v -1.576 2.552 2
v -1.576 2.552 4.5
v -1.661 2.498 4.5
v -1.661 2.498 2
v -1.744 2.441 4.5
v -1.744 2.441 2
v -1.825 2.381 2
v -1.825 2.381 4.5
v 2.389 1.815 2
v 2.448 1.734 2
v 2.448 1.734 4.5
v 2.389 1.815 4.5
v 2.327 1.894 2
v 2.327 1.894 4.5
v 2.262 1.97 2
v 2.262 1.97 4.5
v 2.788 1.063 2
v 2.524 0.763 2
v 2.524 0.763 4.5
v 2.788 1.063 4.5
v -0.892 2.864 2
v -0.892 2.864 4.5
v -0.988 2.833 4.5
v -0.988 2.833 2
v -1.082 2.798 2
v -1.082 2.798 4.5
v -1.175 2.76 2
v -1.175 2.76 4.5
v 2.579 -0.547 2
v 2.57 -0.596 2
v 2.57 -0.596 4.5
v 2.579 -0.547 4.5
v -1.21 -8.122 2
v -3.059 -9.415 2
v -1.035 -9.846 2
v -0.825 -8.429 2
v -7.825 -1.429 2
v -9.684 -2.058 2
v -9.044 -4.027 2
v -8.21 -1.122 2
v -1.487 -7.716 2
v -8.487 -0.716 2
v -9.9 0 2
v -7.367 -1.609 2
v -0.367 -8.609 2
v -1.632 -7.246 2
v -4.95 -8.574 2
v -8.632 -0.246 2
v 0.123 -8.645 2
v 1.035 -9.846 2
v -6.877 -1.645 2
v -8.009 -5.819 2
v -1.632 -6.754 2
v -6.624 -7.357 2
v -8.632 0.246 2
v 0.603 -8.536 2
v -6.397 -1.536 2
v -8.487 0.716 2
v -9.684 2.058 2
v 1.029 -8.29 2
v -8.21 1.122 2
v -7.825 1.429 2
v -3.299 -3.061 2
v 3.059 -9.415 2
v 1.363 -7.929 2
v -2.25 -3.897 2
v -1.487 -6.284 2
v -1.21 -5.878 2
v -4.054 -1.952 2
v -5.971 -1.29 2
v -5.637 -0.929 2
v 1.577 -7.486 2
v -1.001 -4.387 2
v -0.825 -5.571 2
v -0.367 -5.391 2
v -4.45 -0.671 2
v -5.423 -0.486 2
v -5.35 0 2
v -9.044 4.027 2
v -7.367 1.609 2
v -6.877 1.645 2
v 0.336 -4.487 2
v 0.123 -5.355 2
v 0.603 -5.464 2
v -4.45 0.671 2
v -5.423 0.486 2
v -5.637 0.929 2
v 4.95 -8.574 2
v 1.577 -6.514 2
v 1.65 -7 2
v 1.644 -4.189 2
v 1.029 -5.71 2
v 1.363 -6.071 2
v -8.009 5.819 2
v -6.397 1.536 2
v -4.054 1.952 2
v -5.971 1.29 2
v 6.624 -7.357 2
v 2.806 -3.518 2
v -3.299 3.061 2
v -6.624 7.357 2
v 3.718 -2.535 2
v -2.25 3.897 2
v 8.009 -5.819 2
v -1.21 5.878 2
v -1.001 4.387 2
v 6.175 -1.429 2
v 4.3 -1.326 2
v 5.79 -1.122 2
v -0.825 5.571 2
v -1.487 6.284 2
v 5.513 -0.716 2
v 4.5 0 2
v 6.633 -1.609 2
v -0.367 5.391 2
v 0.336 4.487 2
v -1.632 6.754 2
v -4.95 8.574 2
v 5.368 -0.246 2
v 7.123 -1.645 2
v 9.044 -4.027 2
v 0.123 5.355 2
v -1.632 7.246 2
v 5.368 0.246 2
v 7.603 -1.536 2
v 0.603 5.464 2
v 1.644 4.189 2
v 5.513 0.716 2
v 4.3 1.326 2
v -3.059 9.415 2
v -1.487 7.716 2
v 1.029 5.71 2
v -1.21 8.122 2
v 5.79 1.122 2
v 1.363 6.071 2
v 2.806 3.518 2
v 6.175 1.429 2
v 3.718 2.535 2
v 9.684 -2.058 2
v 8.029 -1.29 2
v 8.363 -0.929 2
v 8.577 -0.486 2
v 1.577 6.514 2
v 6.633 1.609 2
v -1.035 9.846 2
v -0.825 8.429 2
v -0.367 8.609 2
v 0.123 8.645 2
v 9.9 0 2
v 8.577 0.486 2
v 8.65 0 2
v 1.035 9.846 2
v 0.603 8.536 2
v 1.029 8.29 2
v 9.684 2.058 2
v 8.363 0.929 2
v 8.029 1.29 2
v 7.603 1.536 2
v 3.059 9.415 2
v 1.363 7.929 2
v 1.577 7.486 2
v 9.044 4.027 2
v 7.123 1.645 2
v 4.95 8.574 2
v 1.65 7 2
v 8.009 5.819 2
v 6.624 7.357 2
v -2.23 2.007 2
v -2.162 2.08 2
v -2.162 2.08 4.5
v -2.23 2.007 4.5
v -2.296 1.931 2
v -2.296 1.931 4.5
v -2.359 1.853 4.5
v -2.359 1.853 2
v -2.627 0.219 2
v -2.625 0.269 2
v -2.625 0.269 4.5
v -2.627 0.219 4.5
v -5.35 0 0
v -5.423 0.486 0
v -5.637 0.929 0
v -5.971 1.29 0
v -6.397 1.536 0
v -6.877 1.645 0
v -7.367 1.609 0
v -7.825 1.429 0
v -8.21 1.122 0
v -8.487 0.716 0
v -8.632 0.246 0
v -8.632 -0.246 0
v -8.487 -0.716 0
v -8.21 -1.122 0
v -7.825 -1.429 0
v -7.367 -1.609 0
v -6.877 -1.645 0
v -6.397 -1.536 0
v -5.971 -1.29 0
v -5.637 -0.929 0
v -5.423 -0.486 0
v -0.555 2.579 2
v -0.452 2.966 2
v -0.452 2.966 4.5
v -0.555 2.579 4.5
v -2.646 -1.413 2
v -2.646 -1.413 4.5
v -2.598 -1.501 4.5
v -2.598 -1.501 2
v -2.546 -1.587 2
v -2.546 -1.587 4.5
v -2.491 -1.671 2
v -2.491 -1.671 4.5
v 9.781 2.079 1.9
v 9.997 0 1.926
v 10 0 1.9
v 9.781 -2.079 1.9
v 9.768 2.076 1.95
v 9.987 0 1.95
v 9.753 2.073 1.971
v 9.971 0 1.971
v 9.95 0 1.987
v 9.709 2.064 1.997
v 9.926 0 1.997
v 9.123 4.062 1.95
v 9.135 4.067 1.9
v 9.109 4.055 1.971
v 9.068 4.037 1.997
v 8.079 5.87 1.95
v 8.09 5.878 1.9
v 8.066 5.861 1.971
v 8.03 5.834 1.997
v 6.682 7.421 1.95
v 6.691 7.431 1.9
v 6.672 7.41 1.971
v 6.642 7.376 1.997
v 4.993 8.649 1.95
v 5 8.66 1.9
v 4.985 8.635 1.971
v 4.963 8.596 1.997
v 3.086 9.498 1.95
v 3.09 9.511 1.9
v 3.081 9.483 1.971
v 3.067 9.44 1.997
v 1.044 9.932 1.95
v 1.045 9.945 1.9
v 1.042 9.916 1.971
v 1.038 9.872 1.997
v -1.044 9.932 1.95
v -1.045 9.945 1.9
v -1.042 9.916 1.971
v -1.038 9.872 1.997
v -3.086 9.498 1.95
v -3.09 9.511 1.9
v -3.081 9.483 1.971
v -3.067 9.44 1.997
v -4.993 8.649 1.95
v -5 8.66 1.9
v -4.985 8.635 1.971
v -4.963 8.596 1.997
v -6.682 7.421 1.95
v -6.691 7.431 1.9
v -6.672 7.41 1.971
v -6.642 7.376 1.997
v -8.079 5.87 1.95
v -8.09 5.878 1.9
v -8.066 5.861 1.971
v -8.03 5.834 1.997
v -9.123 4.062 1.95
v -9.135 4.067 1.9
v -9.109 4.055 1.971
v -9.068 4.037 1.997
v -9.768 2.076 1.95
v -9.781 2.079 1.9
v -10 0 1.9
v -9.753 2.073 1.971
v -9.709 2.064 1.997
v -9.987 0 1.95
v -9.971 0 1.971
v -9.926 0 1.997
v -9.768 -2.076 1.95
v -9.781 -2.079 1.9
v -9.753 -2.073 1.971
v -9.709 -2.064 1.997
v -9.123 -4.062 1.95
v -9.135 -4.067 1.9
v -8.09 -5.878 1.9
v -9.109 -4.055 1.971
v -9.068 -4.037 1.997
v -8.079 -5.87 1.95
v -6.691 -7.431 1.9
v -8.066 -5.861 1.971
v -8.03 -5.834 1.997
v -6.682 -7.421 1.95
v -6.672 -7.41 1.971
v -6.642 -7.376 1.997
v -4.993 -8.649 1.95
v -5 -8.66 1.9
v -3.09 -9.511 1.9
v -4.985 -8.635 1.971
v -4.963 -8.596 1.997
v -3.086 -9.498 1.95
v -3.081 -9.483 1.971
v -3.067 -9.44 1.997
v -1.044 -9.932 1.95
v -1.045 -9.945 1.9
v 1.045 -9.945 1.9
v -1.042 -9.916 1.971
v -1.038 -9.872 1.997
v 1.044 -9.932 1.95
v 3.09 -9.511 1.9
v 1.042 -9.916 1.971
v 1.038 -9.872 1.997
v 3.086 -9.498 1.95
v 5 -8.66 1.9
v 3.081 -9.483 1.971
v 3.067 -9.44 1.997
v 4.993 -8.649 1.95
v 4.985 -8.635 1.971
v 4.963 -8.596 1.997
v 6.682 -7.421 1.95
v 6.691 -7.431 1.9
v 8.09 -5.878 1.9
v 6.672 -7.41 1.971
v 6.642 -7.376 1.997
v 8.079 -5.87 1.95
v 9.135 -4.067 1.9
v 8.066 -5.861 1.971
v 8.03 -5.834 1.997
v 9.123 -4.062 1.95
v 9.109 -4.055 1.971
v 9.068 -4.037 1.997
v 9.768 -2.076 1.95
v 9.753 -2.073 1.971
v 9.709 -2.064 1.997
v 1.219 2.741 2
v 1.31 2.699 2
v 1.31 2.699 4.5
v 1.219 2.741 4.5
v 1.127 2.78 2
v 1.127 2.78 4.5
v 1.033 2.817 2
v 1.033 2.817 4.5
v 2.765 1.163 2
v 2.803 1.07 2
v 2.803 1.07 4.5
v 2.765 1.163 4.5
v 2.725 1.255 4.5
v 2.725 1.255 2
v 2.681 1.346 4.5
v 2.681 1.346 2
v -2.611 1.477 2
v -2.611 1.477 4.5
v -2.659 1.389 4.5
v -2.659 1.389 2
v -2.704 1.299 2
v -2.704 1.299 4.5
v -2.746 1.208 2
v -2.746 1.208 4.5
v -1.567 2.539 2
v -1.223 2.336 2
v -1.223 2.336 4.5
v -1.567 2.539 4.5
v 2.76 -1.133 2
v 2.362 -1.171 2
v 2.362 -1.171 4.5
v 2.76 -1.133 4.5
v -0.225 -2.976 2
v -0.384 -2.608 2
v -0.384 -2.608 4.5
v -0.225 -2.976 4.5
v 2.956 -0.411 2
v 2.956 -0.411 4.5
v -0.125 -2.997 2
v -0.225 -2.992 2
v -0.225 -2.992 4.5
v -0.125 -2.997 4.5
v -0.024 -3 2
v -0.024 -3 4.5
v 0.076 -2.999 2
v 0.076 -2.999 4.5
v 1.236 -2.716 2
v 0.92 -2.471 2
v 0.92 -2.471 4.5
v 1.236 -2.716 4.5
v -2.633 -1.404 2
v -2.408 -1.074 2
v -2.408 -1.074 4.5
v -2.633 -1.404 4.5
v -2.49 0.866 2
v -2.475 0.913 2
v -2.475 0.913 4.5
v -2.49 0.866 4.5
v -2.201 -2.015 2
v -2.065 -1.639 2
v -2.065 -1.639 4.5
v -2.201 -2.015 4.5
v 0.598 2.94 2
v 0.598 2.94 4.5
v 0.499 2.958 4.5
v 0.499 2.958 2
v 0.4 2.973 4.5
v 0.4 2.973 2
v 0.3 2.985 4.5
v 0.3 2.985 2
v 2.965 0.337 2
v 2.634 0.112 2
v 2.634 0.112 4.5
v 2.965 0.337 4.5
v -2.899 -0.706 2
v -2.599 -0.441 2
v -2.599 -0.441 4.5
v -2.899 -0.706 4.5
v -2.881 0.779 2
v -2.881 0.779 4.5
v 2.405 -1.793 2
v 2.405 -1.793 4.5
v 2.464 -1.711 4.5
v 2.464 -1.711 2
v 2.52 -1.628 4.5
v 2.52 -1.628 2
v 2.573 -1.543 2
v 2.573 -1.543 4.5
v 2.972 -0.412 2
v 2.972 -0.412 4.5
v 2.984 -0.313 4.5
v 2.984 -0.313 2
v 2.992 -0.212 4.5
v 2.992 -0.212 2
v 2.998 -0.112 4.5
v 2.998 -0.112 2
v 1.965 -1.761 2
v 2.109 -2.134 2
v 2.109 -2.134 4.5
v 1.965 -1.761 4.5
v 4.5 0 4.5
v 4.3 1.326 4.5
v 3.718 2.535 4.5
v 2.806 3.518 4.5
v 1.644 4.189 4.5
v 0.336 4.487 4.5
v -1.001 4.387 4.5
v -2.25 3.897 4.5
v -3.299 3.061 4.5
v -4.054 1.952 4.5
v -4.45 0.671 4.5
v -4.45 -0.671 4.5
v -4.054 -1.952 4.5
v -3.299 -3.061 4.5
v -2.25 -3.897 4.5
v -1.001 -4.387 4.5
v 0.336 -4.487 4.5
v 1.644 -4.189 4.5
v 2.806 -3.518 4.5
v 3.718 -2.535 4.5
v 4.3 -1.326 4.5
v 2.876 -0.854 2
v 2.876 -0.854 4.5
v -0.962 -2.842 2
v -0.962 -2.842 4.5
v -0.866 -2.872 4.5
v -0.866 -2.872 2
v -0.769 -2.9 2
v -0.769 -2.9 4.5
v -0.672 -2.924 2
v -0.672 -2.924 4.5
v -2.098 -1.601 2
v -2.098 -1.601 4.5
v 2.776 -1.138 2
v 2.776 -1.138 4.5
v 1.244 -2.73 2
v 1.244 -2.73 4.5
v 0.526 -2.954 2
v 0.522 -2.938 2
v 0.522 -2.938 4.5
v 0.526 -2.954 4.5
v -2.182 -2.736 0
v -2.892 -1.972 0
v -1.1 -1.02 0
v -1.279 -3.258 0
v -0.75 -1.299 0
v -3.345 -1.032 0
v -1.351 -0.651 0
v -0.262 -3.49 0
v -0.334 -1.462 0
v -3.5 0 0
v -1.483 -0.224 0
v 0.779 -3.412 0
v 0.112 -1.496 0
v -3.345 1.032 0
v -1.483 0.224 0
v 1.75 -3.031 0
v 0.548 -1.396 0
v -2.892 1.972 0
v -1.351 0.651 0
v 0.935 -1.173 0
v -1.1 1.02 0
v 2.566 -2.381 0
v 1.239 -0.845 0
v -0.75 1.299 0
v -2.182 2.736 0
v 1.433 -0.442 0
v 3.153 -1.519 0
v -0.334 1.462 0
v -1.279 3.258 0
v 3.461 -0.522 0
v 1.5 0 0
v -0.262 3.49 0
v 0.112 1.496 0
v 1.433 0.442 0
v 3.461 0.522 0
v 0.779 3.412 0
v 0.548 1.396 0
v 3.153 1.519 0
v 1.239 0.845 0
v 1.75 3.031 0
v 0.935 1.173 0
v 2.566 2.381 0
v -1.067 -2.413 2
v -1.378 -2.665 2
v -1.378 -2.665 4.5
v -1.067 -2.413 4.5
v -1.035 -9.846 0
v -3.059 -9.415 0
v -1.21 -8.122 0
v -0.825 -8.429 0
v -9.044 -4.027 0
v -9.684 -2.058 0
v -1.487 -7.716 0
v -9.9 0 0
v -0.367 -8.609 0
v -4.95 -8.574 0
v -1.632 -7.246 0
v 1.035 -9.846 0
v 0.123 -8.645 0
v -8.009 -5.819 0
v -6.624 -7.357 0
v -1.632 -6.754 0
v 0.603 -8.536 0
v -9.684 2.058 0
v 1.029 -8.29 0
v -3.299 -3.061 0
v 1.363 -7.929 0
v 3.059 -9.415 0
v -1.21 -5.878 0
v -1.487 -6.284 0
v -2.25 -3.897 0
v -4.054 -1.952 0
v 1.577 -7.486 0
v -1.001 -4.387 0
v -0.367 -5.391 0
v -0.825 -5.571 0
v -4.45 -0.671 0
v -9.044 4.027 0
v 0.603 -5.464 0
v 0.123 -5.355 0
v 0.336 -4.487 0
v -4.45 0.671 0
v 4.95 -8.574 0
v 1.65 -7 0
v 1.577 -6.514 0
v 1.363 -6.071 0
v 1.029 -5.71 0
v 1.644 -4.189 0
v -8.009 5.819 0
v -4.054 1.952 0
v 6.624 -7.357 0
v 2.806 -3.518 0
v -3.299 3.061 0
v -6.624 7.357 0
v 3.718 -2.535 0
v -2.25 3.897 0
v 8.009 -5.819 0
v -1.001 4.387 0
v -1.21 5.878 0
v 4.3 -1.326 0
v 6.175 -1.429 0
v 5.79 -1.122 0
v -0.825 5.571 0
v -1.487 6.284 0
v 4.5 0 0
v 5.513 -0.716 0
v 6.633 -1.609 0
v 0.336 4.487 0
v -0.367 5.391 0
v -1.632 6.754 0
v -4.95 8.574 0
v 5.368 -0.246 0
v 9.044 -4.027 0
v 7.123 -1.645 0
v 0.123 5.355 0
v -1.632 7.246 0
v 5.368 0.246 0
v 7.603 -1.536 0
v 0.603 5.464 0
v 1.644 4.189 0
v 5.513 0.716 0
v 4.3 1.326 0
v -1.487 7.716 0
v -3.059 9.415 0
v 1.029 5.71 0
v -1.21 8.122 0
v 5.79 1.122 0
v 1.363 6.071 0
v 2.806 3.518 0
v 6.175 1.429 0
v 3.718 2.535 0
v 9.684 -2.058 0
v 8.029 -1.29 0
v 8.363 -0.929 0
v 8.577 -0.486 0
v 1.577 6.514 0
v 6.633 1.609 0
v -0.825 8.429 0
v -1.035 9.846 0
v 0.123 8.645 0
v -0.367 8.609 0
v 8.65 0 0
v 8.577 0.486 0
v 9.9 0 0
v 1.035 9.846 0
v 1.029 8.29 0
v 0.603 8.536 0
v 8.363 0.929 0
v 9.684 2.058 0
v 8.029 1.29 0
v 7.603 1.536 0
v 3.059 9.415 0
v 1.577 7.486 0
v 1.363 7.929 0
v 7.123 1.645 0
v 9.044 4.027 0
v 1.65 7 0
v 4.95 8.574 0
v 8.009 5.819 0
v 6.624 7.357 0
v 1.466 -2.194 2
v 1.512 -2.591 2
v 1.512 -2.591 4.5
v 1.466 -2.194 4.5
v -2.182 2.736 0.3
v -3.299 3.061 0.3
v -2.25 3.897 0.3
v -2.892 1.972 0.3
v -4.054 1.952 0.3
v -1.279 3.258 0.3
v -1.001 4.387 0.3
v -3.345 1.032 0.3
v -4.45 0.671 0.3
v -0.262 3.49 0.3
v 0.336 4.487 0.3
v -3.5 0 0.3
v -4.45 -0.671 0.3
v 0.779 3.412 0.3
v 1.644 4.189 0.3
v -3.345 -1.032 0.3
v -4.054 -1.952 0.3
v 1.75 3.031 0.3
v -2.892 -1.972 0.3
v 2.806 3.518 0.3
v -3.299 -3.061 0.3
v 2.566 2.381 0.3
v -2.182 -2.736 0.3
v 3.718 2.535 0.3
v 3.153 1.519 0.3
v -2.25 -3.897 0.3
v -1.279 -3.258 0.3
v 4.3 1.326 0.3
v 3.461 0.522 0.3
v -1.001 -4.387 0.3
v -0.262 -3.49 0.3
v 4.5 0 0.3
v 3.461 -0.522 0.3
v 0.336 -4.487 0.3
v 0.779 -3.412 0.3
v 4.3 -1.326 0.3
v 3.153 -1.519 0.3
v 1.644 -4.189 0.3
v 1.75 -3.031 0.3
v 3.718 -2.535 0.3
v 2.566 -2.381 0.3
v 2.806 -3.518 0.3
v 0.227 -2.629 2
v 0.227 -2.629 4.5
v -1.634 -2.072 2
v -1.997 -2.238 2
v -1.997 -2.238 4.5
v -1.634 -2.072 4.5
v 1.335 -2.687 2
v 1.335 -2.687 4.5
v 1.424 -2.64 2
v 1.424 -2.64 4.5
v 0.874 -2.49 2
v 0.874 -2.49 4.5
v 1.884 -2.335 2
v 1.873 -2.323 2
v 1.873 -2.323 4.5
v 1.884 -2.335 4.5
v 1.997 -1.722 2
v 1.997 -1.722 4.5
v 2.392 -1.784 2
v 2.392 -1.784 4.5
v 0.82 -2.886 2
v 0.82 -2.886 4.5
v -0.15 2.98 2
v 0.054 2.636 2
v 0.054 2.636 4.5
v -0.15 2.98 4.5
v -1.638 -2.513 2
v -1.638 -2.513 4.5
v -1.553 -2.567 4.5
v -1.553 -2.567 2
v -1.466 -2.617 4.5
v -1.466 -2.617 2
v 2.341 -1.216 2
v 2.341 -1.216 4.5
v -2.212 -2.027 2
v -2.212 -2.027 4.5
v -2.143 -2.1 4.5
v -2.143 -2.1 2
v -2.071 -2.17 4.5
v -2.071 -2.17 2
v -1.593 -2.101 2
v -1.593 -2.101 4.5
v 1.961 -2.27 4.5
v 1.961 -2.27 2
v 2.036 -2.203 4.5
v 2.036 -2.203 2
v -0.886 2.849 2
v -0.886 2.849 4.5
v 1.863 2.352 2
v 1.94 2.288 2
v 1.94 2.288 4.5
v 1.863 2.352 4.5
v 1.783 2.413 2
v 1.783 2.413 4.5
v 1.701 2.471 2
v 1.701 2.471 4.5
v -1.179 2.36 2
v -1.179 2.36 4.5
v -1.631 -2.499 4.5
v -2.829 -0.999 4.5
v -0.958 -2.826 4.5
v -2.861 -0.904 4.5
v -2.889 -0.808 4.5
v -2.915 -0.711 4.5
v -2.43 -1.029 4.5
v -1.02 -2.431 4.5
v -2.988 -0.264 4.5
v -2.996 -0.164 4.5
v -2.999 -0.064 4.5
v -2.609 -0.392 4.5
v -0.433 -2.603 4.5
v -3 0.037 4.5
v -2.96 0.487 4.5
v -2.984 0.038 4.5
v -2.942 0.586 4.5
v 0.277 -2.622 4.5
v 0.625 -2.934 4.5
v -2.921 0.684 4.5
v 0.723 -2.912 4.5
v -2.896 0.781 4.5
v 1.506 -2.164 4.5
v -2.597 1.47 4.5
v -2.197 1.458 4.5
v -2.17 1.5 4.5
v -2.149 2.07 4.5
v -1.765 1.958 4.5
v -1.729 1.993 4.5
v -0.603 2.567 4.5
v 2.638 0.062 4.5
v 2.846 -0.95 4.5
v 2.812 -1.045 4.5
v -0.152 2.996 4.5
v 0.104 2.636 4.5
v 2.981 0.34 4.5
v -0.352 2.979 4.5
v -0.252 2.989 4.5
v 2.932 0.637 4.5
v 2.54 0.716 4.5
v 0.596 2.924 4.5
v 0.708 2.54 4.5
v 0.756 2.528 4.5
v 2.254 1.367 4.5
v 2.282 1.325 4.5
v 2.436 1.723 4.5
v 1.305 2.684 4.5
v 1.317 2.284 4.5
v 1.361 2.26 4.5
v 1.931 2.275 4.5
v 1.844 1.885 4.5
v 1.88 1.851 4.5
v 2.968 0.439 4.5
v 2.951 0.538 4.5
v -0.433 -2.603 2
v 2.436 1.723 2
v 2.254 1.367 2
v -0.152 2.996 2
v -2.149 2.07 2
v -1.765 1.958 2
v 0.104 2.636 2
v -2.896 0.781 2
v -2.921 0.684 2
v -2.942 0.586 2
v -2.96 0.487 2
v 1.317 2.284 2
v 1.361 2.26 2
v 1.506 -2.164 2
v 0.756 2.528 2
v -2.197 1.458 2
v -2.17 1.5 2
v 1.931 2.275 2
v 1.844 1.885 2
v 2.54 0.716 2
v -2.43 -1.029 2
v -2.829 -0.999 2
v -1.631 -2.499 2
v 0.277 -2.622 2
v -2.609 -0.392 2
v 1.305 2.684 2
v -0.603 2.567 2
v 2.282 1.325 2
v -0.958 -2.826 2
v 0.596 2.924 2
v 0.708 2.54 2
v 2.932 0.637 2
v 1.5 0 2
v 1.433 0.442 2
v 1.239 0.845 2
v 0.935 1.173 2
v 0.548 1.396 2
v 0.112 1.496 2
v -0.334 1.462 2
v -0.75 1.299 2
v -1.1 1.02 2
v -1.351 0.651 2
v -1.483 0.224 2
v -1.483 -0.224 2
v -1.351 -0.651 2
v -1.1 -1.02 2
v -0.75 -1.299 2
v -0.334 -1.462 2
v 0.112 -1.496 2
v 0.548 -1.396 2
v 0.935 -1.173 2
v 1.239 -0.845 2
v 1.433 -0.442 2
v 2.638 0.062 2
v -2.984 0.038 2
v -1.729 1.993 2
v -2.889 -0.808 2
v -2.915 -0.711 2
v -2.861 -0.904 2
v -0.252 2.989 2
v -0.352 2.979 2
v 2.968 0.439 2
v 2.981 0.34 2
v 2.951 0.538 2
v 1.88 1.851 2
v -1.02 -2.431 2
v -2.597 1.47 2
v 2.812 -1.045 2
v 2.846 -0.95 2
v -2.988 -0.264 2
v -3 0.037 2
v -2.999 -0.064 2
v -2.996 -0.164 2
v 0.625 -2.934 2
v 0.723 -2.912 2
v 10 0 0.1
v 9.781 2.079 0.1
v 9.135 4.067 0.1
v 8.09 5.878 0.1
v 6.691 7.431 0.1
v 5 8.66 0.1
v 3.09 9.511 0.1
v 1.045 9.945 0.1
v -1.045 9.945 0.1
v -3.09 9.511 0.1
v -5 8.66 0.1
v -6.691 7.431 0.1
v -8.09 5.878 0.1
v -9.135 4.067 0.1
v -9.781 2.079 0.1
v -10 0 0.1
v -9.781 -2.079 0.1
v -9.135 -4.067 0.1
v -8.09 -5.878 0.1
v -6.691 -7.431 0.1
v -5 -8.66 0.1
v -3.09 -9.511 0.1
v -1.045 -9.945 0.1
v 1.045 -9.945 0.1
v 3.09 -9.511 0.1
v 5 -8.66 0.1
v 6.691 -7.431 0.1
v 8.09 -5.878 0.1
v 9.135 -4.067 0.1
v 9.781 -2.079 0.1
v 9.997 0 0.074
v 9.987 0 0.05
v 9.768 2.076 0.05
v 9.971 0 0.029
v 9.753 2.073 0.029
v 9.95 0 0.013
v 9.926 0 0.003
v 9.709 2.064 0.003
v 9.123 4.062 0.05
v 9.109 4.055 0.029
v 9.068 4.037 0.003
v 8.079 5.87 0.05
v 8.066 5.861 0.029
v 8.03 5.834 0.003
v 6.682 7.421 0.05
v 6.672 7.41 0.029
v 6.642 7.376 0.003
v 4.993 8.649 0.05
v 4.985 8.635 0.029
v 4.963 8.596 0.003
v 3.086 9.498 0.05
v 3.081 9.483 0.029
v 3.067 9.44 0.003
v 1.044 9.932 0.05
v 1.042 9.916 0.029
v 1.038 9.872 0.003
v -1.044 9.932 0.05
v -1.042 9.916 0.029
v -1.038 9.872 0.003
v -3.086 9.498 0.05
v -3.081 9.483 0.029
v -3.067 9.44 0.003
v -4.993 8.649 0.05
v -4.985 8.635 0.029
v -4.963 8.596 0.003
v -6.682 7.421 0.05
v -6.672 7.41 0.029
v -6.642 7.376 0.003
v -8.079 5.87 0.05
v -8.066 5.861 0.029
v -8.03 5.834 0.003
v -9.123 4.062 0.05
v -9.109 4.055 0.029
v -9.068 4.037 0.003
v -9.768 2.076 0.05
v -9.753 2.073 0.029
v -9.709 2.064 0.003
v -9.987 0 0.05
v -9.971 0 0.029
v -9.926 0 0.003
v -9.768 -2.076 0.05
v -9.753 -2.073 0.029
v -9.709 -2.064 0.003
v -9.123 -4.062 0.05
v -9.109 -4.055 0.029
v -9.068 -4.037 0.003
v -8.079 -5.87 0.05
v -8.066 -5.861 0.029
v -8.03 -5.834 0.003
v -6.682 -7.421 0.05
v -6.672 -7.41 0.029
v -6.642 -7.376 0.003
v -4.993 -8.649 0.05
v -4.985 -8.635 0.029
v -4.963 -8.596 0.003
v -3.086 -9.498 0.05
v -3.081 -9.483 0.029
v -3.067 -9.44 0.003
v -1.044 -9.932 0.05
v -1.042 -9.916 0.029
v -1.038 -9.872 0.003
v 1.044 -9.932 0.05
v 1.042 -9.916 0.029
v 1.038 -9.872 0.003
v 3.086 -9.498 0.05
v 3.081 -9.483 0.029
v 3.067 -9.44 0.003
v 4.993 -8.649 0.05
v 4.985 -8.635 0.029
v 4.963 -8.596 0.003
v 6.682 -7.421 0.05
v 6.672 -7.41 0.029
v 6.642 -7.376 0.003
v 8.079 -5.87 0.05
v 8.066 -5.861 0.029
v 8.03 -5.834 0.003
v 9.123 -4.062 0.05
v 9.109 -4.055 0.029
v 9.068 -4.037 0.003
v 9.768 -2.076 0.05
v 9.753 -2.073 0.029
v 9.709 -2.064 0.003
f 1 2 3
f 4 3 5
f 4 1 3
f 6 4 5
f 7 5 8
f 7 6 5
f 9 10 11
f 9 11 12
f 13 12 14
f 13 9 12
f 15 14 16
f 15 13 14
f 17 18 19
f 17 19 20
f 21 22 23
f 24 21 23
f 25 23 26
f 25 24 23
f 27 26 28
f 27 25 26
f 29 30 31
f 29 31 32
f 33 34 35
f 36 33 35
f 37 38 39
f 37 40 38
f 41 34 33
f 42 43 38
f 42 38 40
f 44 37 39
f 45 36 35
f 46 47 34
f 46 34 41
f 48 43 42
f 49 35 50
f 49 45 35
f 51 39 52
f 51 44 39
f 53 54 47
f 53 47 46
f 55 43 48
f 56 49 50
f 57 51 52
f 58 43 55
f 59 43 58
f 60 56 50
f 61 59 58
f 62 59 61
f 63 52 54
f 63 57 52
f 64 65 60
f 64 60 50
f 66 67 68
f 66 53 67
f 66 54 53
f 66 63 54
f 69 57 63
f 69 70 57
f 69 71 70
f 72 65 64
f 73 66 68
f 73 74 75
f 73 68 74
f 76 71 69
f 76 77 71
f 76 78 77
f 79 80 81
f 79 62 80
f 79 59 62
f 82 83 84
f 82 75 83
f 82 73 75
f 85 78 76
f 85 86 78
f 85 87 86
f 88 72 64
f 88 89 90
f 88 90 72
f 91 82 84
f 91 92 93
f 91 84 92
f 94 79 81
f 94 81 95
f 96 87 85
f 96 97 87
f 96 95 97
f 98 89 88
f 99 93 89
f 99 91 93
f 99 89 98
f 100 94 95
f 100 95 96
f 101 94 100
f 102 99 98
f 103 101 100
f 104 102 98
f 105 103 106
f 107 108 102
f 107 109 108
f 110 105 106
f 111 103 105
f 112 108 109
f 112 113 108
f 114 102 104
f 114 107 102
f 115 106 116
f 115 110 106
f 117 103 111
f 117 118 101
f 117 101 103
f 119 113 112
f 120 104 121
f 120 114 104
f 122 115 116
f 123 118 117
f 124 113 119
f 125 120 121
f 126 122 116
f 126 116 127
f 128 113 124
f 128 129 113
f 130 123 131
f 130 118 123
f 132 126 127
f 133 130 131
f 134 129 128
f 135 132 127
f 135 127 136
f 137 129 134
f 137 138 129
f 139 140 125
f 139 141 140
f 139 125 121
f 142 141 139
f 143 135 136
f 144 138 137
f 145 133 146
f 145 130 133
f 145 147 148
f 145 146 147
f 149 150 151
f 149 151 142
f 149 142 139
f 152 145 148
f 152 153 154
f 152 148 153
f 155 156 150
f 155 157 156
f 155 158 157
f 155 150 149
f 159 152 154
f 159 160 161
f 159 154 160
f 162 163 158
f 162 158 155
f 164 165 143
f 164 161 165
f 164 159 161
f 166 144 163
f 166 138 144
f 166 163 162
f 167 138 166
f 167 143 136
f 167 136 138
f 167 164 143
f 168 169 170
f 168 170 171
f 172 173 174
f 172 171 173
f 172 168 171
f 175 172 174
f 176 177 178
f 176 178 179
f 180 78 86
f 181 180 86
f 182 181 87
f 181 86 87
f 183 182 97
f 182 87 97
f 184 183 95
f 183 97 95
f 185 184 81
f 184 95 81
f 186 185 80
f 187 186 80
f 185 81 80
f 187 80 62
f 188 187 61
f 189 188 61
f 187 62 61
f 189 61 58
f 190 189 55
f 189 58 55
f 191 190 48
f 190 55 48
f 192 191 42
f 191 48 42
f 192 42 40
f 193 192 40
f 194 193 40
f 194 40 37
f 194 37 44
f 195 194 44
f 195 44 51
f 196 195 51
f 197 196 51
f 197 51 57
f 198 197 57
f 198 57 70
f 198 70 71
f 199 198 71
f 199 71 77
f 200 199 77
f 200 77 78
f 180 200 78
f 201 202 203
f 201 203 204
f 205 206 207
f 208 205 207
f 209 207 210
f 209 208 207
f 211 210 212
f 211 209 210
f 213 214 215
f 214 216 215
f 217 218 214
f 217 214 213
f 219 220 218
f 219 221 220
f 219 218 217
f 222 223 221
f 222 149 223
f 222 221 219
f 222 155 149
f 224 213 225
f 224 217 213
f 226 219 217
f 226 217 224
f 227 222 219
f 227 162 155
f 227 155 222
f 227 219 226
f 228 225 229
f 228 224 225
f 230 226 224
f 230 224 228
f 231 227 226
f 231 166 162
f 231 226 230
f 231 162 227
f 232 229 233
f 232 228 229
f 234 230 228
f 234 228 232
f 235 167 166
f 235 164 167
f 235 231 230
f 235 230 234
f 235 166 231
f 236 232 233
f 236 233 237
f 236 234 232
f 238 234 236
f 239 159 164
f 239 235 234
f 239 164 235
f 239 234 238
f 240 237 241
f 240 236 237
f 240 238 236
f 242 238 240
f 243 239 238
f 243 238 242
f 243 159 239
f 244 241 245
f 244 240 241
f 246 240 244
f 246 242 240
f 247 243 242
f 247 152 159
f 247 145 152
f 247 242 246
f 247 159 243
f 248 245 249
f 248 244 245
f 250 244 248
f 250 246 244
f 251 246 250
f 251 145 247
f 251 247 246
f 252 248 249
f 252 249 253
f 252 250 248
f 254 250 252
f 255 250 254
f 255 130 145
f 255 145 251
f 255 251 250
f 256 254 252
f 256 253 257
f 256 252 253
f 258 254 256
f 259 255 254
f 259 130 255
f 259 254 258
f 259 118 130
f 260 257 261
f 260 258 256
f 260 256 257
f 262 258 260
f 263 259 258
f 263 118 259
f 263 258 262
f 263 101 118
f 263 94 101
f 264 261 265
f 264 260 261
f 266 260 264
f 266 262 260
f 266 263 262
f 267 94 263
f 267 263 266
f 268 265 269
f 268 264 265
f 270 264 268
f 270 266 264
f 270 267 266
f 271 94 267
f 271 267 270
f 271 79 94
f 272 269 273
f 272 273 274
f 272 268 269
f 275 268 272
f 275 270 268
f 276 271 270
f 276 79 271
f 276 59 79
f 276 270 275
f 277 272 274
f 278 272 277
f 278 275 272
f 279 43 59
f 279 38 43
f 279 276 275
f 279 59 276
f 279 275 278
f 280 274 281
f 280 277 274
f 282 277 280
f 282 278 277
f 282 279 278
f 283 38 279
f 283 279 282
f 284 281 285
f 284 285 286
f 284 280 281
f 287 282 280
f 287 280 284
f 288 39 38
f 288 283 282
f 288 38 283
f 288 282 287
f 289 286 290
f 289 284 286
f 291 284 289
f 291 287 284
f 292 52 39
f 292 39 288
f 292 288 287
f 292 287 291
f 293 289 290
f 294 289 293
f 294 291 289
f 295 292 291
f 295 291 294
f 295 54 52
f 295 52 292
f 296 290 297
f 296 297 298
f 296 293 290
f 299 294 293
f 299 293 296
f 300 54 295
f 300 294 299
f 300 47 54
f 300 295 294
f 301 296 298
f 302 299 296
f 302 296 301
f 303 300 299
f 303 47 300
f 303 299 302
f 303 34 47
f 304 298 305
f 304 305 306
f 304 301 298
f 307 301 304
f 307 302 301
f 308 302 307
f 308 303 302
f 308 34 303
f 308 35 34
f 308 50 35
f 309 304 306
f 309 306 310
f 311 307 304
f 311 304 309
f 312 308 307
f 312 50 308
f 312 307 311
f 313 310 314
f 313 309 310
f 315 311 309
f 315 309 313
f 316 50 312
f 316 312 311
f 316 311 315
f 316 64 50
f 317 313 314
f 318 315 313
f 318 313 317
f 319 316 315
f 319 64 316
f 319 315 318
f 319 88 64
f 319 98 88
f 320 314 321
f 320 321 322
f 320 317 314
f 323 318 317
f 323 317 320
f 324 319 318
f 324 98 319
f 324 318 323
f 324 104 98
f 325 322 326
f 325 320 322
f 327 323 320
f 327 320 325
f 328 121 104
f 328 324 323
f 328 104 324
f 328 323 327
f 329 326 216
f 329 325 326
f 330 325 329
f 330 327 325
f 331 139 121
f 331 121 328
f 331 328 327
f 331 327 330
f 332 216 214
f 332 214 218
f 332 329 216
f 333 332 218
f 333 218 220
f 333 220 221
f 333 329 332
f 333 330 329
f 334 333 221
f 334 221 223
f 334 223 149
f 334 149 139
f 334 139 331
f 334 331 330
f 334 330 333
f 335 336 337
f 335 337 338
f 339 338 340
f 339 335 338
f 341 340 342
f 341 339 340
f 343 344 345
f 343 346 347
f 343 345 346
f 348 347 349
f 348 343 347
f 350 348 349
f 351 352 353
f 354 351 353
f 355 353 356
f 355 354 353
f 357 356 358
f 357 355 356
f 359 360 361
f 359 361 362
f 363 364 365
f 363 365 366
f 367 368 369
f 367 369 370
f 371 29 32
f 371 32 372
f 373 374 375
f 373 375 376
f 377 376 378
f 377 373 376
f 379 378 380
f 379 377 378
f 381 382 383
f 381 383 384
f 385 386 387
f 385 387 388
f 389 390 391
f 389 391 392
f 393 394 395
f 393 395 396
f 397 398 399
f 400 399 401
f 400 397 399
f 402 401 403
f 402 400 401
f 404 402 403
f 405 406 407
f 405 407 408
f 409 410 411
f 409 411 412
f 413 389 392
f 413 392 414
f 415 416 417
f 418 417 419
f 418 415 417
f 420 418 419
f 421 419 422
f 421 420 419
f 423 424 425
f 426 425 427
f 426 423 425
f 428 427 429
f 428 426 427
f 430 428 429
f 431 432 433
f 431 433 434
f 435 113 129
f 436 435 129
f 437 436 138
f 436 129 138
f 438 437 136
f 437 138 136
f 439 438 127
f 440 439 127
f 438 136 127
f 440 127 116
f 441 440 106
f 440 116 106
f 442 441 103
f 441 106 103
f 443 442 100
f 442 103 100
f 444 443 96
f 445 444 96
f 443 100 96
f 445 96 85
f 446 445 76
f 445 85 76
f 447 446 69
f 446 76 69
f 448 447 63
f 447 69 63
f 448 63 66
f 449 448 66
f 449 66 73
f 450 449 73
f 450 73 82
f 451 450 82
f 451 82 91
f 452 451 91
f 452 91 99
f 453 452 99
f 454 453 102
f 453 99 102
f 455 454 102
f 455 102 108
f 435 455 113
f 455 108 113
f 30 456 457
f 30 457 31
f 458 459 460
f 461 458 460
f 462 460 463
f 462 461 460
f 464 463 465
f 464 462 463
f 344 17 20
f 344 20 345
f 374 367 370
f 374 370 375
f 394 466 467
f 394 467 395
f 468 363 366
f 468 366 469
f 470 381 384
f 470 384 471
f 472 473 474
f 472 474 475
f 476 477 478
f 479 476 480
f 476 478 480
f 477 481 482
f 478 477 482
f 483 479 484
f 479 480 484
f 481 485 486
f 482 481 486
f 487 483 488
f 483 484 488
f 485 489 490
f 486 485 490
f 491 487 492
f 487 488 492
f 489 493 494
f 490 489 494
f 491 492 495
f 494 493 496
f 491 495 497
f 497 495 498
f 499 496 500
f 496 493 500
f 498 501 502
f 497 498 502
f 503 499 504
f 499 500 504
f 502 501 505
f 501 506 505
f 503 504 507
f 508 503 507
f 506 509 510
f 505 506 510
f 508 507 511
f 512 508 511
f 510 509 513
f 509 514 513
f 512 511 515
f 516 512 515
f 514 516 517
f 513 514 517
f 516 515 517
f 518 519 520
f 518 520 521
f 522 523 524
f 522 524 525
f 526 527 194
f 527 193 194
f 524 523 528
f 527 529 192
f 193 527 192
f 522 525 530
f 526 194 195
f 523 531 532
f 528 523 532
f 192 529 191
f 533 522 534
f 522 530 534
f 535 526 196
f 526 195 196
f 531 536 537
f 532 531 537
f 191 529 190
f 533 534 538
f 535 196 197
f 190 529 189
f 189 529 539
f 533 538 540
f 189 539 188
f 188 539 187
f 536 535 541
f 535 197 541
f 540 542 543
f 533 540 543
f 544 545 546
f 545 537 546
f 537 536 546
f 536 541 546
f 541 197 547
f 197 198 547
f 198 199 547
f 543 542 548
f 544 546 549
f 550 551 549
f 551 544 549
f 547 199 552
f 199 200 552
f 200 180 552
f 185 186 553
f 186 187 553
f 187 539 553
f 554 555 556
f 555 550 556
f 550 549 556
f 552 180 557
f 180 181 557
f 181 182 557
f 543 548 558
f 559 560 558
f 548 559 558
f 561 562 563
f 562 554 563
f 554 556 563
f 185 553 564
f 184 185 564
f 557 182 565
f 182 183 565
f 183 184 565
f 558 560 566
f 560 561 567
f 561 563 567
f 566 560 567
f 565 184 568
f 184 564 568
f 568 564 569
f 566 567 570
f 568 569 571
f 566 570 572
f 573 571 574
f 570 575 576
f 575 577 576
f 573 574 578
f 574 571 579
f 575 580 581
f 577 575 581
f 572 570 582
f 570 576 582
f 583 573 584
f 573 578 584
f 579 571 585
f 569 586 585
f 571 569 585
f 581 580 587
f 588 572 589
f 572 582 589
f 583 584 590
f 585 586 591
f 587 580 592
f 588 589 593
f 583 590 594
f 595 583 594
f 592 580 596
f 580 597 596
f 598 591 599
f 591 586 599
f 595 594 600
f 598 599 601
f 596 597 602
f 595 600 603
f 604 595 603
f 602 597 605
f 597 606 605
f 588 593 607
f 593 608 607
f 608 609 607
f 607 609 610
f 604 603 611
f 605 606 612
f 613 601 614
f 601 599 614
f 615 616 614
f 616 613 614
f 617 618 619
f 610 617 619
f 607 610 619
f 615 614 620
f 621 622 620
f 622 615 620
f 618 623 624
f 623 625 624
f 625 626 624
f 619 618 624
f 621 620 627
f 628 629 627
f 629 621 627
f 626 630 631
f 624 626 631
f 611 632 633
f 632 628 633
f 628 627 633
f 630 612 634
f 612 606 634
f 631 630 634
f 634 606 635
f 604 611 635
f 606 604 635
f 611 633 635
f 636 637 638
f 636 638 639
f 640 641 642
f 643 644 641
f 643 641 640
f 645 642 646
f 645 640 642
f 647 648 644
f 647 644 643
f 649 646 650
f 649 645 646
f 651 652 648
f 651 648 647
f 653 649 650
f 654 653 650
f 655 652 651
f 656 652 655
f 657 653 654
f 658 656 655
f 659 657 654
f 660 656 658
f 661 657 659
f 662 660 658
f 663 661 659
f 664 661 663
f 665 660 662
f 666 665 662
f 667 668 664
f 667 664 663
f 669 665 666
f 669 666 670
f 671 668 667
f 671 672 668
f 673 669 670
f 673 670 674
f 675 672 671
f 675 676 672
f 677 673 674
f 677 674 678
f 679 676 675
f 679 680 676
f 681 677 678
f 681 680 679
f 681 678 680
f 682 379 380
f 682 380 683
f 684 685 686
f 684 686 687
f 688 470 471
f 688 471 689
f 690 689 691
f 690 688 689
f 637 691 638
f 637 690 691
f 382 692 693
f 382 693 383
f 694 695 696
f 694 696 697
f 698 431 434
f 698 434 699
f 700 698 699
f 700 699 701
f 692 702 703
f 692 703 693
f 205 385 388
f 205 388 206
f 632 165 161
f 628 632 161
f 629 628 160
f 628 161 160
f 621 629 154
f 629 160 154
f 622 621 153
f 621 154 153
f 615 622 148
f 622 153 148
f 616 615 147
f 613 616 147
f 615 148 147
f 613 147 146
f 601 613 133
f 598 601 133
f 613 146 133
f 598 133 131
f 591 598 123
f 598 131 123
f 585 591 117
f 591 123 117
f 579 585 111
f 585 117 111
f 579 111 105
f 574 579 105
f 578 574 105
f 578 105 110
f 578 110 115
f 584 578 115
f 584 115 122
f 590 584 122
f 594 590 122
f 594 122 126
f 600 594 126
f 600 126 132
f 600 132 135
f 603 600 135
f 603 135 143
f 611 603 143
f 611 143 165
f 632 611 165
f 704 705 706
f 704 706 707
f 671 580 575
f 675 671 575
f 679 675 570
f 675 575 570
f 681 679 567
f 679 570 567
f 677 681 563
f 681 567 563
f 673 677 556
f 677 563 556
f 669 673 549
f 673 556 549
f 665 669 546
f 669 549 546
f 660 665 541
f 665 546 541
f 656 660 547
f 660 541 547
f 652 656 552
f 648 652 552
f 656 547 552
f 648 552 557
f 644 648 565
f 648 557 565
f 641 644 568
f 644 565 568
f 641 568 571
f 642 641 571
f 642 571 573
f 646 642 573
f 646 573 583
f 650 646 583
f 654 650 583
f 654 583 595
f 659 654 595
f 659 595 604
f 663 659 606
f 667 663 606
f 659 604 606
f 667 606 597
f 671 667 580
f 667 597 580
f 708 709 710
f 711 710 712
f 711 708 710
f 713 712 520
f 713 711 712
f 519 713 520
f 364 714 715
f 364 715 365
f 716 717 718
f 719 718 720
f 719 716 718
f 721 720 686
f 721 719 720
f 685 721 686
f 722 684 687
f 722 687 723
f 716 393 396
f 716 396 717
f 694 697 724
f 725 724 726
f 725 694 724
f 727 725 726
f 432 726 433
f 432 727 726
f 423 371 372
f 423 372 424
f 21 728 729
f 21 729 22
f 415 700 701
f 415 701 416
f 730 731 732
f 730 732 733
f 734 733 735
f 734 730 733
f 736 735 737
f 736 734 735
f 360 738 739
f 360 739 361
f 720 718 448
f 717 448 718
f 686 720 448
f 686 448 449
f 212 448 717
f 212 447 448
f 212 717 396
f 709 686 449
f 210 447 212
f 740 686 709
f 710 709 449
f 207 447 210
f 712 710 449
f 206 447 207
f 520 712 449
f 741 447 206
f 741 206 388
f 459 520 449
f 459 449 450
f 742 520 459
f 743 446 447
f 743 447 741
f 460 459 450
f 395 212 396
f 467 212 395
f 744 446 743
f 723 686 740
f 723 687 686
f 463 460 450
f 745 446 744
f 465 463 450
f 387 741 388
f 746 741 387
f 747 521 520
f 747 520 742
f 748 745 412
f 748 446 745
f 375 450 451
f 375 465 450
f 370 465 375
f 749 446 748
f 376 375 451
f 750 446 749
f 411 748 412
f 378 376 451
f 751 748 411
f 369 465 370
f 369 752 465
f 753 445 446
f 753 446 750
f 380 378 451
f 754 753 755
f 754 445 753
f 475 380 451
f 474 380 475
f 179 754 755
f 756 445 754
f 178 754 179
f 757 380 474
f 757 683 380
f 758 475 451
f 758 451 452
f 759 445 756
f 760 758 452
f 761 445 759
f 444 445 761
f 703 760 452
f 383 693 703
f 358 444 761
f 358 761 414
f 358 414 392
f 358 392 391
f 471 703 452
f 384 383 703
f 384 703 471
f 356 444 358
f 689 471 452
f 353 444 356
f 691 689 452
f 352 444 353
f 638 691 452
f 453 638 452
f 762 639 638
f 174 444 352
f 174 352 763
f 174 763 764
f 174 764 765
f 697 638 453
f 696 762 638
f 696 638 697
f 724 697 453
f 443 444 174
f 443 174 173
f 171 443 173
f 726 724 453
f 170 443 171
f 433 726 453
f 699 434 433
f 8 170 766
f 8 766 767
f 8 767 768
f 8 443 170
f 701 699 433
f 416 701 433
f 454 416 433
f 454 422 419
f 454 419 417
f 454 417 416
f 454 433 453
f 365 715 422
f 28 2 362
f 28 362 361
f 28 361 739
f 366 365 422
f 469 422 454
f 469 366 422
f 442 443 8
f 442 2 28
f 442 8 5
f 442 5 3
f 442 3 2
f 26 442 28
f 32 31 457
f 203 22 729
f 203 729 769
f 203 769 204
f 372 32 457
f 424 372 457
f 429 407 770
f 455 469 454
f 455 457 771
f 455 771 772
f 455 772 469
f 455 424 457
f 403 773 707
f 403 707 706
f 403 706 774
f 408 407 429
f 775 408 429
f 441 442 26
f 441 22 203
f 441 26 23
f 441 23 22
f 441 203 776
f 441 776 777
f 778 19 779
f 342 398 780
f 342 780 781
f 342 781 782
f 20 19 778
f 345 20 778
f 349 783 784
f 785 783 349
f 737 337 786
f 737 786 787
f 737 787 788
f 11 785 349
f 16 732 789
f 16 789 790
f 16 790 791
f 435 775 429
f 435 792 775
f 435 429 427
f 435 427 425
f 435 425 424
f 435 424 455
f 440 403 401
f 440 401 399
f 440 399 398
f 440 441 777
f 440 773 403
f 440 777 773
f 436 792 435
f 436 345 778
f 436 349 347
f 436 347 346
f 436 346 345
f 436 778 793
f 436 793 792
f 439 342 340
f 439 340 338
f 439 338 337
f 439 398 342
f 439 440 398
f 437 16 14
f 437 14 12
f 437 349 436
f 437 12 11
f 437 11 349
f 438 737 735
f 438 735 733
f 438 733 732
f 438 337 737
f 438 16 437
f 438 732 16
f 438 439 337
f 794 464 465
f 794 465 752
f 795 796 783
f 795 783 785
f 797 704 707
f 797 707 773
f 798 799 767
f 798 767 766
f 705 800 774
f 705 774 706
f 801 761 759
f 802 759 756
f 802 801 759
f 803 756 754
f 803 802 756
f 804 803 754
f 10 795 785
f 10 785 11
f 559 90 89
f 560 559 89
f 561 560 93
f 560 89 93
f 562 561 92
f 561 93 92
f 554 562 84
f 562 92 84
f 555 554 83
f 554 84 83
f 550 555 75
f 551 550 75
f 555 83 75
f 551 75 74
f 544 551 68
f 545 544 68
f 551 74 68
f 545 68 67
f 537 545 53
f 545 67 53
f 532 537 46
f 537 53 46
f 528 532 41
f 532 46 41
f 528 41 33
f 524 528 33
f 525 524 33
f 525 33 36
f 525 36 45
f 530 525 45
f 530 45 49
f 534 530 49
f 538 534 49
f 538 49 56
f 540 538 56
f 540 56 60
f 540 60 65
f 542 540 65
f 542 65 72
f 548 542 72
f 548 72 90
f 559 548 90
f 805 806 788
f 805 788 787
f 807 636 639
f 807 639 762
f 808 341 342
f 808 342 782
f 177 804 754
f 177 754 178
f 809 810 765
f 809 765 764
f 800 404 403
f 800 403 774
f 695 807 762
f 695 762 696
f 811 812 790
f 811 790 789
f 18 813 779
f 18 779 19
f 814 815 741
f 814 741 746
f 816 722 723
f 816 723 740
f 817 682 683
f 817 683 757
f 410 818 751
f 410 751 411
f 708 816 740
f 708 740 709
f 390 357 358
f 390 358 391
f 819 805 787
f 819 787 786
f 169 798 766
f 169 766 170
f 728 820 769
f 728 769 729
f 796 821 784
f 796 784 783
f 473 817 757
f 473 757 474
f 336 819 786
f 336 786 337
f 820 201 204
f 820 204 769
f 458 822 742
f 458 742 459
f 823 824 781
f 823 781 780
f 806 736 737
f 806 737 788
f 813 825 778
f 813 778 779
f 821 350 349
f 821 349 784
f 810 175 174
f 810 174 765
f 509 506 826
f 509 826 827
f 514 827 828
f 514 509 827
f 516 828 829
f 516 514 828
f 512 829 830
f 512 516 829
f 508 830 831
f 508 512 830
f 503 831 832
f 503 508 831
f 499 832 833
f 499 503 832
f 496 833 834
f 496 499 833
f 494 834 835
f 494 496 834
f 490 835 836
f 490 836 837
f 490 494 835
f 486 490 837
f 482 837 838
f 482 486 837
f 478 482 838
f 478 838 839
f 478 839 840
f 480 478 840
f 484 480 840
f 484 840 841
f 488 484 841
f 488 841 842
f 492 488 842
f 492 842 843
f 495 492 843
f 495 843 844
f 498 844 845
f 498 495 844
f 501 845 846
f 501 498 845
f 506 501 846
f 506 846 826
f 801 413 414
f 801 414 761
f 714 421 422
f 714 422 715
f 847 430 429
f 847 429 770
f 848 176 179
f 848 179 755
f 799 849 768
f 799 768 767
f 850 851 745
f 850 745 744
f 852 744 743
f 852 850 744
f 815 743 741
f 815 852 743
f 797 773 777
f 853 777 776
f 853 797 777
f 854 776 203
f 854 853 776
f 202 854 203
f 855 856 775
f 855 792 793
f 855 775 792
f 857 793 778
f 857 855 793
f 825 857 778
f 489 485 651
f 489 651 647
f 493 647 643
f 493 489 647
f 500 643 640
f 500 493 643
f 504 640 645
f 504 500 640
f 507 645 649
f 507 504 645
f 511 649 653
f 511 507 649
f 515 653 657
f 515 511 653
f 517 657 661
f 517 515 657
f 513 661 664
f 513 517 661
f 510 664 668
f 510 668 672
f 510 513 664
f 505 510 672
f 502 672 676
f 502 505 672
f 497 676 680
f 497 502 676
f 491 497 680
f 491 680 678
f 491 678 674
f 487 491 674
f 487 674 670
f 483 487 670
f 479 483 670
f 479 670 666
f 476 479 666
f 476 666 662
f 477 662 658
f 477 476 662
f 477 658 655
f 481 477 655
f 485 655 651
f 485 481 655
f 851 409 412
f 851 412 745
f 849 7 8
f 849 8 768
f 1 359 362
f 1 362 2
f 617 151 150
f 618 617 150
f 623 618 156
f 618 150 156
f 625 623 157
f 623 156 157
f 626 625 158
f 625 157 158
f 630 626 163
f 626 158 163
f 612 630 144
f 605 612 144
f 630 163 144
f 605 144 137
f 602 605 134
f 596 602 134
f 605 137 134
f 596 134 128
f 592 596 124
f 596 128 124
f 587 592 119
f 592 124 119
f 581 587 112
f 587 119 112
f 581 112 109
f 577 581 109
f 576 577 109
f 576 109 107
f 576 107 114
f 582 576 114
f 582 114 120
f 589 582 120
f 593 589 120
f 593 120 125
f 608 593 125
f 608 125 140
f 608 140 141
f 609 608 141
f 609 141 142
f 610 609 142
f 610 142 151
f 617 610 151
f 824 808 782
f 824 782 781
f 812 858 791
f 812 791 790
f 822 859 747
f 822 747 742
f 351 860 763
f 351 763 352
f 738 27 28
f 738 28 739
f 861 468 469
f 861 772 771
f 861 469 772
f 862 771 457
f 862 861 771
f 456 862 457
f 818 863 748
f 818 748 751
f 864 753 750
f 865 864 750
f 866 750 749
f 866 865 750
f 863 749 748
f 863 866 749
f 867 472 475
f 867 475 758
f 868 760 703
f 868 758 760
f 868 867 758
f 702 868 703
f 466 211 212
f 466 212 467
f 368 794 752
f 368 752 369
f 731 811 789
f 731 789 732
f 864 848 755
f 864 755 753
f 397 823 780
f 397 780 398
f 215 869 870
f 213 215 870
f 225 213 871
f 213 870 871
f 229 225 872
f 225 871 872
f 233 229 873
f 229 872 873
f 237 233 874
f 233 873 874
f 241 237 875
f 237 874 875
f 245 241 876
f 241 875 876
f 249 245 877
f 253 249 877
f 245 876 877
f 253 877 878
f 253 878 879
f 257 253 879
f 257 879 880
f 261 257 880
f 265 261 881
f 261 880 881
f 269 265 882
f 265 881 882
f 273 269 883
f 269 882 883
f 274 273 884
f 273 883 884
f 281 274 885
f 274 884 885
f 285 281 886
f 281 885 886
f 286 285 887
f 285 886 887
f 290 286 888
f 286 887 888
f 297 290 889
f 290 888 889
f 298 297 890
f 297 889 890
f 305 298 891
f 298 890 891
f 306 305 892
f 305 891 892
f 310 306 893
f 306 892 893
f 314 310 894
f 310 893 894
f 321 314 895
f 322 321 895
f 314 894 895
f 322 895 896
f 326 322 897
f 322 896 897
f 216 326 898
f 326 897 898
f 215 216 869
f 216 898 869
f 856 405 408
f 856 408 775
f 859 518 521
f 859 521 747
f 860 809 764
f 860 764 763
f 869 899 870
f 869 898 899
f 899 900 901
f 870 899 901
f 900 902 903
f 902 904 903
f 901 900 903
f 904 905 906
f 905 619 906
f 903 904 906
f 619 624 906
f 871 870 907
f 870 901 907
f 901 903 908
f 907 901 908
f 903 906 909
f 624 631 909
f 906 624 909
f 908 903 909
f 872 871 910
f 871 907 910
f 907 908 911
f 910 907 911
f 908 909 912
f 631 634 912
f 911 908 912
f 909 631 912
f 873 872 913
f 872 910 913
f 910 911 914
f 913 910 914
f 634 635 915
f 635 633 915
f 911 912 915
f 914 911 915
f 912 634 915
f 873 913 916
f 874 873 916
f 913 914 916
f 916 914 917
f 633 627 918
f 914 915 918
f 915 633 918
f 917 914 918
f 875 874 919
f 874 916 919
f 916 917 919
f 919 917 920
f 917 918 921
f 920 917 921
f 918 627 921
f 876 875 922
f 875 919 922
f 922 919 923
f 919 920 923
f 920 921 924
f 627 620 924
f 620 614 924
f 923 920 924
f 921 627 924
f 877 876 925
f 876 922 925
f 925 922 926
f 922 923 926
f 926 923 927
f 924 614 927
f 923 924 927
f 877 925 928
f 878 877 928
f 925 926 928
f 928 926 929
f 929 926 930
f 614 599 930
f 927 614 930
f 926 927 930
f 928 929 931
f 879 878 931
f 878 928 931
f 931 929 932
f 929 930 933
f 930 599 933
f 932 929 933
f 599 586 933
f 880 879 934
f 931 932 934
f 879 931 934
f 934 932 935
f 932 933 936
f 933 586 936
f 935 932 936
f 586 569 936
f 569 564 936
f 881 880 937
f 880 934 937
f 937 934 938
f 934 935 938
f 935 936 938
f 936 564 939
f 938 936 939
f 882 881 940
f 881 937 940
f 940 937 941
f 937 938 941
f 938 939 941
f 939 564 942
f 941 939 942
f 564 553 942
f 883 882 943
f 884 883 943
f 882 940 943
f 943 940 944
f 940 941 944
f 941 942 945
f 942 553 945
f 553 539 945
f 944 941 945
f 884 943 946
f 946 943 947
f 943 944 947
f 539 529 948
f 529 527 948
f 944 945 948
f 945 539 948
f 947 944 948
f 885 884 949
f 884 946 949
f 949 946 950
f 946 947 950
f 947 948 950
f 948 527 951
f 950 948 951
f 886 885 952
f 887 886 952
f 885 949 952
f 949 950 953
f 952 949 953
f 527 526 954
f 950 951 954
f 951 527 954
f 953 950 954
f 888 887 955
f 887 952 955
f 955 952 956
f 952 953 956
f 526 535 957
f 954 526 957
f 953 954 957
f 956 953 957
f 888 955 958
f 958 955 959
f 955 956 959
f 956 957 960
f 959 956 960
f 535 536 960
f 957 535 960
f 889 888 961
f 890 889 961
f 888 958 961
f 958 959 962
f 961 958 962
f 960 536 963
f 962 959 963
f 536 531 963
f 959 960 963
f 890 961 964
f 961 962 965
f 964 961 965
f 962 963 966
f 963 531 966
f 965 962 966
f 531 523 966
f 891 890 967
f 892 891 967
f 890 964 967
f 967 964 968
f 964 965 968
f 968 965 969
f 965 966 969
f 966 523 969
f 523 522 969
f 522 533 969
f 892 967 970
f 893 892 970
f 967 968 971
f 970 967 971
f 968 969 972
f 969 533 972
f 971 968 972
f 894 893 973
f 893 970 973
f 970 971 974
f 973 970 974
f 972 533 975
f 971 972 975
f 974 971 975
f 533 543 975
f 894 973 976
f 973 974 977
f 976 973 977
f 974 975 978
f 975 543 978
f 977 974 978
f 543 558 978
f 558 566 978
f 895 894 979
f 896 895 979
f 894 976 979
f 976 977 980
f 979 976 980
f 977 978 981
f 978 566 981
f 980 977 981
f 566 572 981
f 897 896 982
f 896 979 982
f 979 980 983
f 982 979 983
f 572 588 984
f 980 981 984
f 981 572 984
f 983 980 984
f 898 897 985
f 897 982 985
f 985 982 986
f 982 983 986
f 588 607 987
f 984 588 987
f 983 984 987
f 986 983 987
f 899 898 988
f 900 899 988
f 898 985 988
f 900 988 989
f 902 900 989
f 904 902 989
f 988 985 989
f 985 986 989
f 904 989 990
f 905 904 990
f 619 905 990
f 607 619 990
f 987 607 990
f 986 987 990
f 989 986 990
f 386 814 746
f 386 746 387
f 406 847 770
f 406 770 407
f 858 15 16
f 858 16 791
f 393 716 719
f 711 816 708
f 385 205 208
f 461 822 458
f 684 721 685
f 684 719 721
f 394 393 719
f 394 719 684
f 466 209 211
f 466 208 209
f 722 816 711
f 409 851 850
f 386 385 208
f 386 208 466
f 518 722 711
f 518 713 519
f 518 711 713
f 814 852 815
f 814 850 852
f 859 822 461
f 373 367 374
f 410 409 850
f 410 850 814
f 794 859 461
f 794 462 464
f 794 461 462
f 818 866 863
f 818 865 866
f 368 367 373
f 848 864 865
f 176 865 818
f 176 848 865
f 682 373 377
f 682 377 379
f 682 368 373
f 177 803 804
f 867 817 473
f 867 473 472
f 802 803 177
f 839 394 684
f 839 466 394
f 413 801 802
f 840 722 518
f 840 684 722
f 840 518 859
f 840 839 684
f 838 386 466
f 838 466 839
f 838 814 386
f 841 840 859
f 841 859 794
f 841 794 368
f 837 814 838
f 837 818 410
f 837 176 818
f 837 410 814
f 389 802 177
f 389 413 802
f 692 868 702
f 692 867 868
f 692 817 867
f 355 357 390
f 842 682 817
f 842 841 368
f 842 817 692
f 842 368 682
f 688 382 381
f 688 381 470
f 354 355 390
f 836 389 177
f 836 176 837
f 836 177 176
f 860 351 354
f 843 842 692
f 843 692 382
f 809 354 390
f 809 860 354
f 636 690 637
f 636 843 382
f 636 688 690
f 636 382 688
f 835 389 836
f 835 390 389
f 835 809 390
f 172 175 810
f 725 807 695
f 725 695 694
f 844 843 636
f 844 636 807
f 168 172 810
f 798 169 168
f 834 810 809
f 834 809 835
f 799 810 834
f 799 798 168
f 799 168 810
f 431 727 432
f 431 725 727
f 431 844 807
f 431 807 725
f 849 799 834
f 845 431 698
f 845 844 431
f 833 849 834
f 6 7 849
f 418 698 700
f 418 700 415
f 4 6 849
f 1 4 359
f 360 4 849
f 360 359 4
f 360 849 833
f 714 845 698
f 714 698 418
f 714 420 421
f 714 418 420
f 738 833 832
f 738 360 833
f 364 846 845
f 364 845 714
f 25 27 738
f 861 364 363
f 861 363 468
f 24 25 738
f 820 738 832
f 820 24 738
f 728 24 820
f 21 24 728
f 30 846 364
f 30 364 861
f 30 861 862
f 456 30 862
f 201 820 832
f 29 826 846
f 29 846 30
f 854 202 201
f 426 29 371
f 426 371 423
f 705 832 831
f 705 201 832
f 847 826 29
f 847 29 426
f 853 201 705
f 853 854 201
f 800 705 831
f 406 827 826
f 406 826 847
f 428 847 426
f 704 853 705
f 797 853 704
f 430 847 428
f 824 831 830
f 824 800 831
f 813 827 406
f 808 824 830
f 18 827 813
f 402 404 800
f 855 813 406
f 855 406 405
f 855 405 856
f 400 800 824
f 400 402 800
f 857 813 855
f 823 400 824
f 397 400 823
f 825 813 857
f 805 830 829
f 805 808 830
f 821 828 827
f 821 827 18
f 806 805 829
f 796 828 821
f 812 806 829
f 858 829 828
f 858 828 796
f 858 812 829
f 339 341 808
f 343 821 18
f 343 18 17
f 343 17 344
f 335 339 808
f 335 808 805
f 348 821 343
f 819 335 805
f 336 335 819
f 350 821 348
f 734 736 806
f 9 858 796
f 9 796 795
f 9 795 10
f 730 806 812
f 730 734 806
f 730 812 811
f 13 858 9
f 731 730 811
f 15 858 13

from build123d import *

# Parameters (mm, degrees)
SKETCH3_R           = 10
SKETCH3_R_2         = 1.5
BOSS_EXTRUDE2_DEPTH = 2
FILLET1_R           = 0.1
SKETCH5_R           = 4.5
SKETCH5_R_2         = 3
BOSS_EXTRUDE3_DEPTH = 2.5
SKETCH6_R           = 4.5
SKETCH6_R_2         = 3.5
CUT_EXTRUDE3_DEPTH  = 0.3
BOSS_EXTRUDE1_DEPTH = 4.5
CIRPATTERN6_COUNT   = 25
CUT_EXTRUDE4_REACH  = 16.361
SKETCH8_R           = 1.65


with BuildPart() as part:
    # Sketch3 → Boss-Extrude2 (new body)
    with BuildSketch(Plane.XY):
        Circle(SKETCH3_R)
        Circle(SKETCH3_R_2, mode=Mode.SUBTRACT)
    extrude(amount=BOSS_EXTRUDE2_DEPTH)

    # Fillet1
    fillet1_edges = [part.edges().sort_by_distance(p)[0] for p in [
        (-10, 0, 0),
        (-10, 0, 2),
    ]]
    fillet(fillet1_edges, radius=FILLET1_R)

    # Sketch5 → Boss-Extrude3 (add)
    with BuildSketch(Plane.XY.offset(2)):
        Circle(SKETCH5_R)
        Circle(SKETCH5_R_2, mode=Mode.SUBTRACT)
    extrude(amount=BOSS_EXTRUDE3_DEPTH)

    # Sketch6 → Cut-Extrude3 (cut)
    with BuildSketch(Plane(origin=(0, 0, 0), x_dir=(-1, 0, 0), z_dir=(0, 0, -1))):
        with Locations(Location((0, 0, 0), (0, 0, 180))):
            Circle(SKETCH6_R)
        Circle(SKETCH6_R_2, mode=Mode.SUBTRACT)
    extrude(amount=-CUT_EXTRUDE3_DEPTH, mode=Mode.SUBTRACT)

    # Sketch2 → Boss-Extrude1 (add)
    with BuildSketch(Plane.XY):
        Polygon((-0.224920346, -2.97556486), (-0.224920346, -3.054661592), (-0.671931157, -3.032807749), (-0.671931157, -2.923783255), (-0.433398187, -2.602688219), (-0.383730319, -2.608441731), align=None)
    boss_extrude1 = extrude(amount=BOSS_EXTRUDE1_DEPTH)

    # CirPattern6: Boss-Extrude1 ×25 about axis
    cirpattern6_axis = Axis((0, 0, 0), (0, 0, 1))
    for i in range(1, CIRPATTERN6_COUNT):
        add(boss_extrude1.rotate(cirpattern6_axis, i * 360 / CIRPATTERN6_COUNT))

    # Sketch8 → Cut-Extrude4 (cut, up to next)
    with BuildSketch(Plane.XY.offset(2), mode=Mode.PRIVATE) as cut_extrude4_sk1:
        with Locations((0, 7)):
            Circle(SKETCH8_R)
    cut_extrude4_tool1 = extrude(cut_extrude4_sk1.sketch, amount=-CUT_EXTRUDE4_REACH, mode=Mode.PRIVATE) & part.part
    # Sketch8 → Cut-Extrude4 (cut, up to next)
    with BuildSketch(Plane.XY.offset(2), mode=Mode.PRIVATE) as cut_extrude4_sk2:
        with Locations((0, -7)):
            Circle(SKETCH8_R)
    cut_extrude4_tool2 = extrude(cut_extrude4_sk2.sketch, amount=-CUT_EXTRUDE4_REACH, mode=Mode.PRIVATE) & part.part
    # Sketch8 → Cut-Extrude4 (cut, up to next)
    with BuildSketch(Plane.XY.offset(2), mode=Mode.PRIVATE) as cut_extrude4_sk3:
        with Locations((7, 0)):
            Circle(SKETCH8_R)
    cut_extrude4_tool3 = extrude(cut_extrude4_sk3.sketch, amount=-CUT_EXTRUDE4_REACH, mode=Mode.PRIVATE) & part.part
    # Sketch8 → Cut-Extrude4 (cut, up to next)
    with BuildSketch(Plane.XY.offset(2), mode=Mode.PRIVATE) as cut_extrude4_sk4:
        with Locations((-7, 0)):
            Circle(SKETCH8_R)
    cut_extrude4_tool4 = extrude(cut_extrude4_sk4.sketch, amount=-CUT_EXTRUDE4_REACH, mode=Mode.PRIVATE) & part.part
    add(cut_extrude4_tool1.solids().sort_by_distance((0, 7, 2))[0], mode=Mode.SUBTRACT)
    add(cut_extrude4_tool2.solids().sort_by_distance((0, -7, 2))[0], mode=Mode.SUBTRACT)
    add(cut_extrude4_tool3.solids().sort_by_distance((7, 0, 2))[0], mode=Mode.SUBTRACT)
    add(cut_extrude4_tool4.solids().sort_by_distance((-7, 0, 2))[0], mode=Mode.SUBTRACT)


solid = part.part
